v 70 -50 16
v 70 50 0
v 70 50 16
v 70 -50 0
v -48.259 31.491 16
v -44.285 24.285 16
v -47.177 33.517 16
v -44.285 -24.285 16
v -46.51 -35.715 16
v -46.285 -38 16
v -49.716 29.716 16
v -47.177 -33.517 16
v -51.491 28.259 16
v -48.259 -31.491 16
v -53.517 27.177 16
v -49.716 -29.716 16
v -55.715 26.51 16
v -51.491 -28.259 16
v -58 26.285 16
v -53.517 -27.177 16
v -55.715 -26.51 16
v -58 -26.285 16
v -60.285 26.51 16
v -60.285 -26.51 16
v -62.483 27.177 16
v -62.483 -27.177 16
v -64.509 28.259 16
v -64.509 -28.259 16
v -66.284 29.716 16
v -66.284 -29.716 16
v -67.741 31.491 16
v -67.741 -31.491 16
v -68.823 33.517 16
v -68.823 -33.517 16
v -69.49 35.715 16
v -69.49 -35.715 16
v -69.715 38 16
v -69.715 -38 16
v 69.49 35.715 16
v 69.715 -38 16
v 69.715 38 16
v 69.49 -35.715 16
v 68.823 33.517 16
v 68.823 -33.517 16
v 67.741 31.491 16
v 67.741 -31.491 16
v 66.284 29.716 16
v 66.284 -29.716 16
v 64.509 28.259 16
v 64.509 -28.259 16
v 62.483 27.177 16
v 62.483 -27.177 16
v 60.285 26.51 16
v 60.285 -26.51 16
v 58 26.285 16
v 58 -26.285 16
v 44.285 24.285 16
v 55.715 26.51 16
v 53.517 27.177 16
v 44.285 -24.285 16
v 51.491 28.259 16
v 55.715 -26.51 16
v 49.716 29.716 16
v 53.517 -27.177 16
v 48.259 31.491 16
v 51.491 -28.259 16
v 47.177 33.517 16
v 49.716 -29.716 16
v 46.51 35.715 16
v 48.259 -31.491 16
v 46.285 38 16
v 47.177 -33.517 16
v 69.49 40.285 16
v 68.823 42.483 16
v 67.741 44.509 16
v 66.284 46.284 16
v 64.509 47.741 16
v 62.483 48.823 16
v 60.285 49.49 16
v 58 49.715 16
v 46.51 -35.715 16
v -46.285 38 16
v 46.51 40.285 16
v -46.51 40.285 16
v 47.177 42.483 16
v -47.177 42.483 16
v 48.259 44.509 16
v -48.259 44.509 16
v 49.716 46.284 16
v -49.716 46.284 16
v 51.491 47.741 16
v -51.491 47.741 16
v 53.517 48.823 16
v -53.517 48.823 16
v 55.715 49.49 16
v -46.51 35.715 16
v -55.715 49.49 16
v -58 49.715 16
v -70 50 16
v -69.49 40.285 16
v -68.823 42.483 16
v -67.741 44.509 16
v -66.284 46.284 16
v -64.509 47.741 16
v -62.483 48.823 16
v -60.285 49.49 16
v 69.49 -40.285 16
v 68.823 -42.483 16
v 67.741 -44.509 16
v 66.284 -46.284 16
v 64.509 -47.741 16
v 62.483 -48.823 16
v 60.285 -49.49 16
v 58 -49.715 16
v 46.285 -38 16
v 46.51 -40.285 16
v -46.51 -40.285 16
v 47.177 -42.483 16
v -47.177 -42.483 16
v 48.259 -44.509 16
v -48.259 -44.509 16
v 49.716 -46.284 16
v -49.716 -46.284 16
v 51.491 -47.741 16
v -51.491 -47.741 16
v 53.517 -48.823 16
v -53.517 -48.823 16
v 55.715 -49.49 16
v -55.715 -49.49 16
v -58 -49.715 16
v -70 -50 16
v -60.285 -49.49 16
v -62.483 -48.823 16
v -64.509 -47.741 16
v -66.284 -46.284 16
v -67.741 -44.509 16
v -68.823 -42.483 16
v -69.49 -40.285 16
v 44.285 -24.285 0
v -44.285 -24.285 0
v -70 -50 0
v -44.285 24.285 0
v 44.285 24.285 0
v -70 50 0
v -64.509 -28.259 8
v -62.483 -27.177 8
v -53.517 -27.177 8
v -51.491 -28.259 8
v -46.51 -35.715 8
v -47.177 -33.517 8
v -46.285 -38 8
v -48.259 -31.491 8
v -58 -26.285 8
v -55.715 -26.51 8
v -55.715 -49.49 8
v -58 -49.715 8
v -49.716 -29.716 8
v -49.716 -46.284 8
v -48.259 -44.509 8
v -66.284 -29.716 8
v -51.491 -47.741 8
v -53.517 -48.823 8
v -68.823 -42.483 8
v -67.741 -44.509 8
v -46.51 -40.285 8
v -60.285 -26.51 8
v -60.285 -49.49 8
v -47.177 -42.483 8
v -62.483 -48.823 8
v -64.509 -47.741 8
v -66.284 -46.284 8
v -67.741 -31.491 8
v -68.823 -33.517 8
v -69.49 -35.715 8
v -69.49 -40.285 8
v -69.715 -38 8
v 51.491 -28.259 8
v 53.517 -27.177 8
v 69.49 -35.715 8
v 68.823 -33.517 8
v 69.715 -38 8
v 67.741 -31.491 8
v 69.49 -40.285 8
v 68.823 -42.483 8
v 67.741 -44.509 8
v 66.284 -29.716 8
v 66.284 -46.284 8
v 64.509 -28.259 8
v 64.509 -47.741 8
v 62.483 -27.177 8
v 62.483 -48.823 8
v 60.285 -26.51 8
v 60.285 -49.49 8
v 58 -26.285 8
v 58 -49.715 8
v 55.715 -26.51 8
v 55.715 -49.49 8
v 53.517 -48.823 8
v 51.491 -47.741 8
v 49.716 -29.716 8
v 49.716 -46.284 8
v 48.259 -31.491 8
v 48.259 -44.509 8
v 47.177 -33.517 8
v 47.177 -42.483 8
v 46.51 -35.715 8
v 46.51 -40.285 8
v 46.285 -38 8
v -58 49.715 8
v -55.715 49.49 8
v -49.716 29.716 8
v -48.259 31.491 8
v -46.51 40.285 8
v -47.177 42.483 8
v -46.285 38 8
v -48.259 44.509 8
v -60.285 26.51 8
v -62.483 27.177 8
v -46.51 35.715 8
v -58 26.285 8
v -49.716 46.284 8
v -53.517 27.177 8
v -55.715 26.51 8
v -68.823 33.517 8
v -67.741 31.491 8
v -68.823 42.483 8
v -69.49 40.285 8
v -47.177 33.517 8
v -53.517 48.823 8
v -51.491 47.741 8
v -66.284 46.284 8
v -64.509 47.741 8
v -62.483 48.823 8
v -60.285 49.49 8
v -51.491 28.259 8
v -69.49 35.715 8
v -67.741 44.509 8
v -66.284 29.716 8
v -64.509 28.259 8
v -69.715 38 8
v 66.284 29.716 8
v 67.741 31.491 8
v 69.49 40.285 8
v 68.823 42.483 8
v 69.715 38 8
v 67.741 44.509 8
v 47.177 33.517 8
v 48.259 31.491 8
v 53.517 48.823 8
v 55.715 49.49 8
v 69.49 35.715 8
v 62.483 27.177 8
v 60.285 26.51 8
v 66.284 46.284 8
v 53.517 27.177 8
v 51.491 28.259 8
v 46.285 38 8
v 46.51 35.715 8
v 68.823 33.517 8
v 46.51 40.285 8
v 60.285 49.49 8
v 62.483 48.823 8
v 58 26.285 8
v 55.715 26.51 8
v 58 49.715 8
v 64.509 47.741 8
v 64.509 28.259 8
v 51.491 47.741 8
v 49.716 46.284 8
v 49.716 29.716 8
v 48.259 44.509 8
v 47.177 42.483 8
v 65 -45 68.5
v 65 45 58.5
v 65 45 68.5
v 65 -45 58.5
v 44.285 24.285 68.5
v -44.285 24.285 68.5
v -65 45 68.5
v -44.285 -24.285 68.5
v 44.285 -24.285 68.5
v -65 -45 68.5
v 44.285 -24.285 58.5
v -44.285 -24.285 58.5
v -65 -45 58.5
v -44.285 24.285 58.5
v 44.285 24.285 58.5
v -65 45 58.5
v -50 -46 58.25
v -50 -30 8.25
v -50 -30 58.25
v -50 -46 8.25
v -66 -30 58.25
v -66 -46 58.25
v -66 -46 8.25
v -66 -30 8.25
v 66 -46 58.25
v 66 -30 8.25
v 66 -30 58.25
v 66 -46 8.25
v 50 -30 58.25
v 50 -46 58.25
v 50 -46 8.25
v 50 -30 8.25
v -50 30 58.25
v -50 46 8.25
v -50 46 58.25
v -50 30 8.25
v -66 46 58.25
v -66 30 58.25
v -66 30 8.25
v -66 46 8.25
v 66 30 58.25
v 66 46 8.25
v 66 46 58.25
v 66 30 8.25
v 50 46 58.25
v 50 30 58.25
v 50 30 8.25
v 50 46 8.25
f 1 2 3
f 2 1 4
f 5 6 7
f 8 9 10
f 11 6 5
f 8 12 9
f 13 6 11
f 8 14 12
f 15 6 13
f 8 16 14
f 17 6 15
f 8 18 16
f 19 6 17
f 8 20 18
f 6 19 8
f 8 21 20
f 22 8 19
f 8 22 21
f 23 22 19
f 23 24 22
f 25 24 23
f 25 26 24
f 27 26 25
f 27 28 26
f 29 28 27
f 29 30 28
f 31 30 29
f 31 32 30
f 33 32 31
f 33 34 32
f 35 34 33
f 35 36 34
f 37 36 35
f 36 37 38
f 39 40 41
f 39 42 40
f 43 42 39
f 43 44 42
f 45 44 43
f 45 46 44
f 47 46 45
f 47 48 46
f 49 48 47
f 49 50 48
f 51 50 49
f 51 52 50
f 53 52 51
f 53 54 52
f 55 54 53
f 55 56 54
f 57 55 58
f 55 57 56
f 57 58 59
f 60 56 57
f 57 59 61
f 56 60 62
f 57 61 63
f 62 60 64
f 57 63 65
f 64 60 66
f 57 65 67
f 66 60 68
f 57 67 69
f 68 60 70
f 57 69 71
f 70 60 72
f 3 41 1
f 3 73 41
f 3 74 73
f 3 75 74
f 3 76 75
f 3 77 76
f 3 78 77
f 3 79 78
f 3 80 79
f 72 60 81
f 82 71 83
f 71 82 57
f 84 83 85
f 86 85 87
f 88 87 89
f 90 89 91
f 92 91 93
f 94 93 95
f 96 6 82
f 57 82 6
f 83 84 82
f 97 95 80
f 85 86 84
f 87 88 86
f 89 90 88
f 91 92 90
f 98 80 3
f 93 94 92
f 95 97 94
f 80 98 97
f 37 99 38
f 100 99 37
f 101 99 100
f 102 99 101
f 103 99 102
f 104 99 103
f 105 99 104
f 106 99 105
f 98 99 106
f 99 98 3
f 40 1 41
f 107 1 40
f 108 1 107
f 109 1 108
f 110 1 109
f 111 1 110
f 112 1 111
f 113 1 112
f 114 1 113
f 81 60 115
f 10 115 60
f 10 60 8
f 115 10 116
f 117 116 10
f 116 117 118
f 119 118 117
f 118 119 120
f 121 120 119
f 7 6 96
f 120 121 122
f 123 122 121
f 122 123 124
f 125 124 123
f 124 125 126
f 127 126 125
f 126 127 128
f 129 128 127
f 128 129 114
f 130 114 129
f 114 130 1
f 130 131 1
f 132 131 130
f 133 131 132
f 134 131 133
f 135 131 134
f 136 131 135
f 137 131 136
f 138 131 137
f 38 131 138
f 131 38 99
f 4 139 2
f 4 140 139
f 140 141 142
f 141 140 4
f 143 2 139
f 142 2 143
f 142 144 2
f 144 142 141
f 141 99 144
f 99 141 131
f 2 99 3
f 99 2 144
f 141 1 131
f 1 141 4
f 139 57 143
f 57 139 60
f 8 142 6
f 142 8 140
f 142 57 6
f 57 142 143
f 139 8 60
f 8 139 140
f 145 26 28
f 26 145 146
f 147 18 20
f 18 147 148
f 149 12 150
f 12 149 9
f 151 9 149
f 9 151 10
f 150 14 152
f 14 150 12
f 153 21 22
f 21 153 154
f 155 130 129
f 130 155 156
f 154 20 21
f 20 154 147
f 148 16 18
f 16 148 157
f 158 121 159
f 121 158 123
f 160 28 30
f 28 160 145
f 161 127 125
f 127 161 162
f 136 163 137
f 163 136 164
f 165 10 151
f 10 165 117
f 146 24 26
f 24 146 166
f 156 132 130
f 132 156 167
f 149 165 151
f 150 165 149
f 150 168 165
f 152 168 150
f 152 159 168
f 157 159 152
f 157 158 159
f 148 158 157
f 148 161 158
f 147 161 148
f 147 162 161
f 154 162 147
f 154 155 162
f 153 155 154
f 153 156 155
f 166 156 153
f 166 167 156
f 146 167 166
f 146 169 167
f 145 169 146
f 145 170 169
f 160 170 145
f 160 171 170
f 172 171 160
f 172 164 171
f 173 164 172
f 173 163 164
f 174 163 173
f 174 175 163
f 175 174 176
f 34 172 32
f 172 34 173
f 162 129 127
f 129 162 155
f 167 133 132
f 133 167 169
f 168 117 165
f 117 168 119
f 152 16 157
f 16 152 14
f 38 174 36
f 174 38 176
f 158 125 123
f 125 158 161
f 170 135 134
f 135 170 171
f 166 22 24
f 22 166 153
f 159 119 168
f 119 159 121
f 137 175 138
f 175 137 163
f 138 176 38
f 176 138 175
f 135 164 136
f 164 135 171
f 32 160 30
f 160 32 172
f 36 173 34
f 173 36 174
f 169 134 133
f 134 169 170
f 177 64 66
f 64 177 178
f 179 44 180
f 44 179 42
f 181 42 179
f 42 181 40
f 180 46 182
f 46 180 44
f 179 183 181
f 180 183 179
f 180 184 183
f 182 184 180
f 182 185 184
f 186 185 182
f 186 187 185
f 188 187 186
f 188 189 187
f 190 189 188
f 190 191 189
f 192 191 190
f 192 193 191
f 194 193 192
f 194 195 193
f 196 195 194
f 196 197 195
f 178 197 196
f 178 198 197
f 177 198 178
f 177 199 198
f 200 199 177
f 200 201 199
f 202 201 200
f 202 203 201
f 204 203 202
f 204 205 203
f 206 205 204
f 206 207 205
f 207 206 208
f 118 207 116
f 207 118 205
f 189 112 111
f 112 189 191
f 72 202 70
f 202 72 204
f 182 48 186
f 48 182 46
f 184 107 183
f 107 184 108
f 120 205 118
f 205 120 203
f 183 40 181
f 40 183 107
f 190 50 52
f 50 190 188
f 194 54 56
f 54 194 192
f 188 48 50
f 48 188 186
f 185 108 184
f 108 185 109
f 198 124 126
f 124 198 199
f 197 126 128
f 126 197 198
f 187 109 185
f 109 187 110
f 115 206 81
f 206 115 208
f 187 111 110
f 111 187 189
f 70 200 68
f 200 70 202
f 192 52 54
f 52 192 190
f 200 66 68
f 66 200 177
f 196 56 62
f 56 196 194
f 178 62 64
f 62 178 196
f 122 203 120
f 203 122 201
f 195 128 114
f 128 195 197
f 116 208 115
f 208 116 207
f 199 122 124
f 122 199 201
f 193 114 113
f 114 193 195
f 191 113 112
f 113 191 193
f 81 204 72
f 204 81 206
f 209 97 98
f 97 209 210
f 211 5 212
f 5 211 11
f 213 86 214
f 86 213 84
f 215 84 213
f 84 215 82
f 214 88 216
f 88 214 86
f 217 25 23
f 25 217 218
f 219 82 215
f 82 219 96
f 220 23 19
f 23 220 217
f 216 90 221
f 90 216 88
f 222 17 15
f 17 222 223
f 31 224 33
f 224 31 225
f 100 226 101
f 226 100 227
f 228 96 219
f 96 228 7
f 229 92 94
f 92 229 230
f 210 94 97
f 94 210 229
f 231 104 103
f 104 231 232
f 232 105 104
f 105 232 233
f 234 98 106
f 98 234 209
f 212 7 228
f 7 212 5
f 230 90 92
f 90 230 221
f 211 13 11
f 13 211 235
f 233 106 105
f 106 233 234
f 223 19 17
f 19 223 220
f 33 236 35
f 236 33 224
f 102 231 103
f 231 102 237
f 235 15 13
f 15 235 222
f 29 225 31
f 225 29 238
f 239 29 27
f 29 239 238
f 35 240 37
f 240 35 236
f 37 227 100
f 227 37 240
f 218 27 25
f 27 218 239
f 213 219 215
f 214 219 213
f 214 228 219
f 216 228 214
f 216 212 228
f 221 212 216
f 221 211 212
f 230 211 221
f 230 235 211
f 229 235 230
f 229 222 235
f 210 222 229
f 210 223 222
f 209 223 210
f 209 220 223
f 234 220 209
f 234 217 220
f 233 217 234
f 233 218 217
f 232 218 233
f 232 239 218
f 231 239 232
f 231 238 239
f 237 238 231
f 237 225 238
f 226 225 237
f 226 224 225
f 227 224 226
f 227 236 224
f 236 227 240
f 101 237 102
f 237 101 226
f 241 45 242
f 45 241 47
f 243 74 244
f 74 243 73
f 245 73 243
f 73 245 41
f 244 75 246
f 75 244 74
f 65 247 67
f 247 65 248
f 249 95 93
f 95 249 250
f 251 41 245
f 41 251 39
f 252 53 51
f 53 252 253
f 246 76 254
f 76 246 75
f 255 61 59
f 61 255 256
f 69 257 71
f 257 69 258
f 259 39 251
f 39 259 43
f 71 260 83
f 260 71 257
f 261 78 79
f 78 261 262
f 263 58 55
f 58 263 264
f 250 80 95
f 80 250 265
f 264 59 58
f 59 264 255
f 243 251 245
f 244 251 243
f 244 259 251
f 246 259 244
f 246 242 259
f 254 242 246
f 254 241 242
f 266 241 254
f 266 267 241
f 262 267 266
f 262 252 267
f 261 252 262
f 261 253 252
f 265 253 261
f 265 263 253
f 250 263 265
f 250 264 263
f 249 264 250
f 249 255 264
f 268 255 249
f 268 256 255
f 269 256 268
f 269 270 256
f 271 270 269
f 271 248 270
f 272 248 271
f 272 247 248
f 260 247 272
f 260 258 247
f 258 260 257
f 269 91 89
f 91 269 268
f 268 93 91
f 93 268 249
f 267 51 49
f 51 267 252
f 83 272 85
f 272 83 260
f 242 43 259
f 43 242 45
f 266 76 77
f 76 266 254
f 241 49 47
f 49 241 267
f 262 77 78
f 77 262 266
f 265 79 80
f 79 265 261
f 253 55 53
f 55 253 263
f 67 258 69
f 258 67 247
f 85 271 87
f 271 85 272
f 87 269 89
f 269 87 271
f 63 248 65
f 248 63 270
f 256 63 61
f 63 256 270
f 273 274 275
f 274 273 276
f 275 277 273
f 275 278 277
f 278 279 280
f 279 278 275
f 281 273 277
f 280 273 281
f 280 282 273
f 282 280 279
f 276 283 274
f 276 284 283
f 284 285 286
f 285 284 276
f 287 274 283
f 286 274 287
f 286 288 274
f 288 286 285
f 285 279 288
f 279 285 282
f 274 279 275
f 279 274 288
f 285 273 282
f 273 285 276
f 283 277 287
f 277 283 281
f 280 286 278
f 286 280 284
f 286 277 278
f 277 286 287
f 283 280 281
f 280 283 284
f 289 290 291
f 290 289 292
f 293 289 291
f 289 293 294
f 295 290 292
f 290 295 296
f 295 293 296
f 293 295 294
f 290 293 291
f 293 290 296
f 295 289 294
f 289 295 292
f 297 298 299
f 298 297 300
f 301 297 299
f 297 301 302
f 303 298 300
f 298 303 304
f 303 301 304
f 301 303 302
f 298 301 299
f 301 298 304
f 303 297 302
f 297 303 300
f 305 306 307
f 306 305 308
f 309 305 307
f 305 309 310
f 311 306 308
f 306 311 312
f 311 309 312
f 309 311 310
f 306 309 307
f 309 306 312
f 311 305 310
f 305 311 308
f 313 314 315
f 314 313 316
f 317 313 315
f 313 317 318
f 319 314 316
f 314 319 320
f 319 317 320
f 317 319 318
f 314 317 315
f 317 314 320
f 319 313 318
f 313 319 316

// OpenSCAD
$fn = 32;

// ------------------------------------------------------------------------
// Frame cube: base 140 x 100 mm, posts 50 mm tall
// Every part is its own module, assembly() places every instance.
// ------------------------------------------------------------------------

// --- part 1 ---
module base_frame() {
  difference() {
    translate([-70, -50, 0]) cube([140, 100, 16]);
    translate([-44.285, -24.285, -1]) cube([88.57, 48.57, 18]);
    translate([-58, -38, 8]) cylinder(h = 9, d = 23.43);
    translate([58, -38, 8]) cylinder(h = 9, d = 23.43);
    translate([-58, 38, 8]) cylinder(h = 9, d = 23.43);
    translate([58, 38, 8]) cylinder(h = 9, d = 23.43);
  }
}

// --- part 2 ---
module corner_post() {
  translate([-8, -8, 0]) cube([16, 16, 50]);
}

// --- part 3 ---
module top_frame() {
  difference() {
    translate([-65, -45, 0]) cube([130, 90, 10]);
    translate([-44.285, -24.285, -1]) cube([88.57, 48.57, 12]);
  }
}

// --- assembly ---
module assembly() {
  color([0.80, 0.24, 0.20]) translate([0, 0, 0]) rotate([0, 0, 0]) base_frame();
  color([0.20, 0.45, 0.75]) translate([-58, -38, 8.25]) rotate([0, 0, 0]) corner_post();
  color([0.25, 0.62, 0.32]) translate([58, -38, 8.25]) rotate([0, 0, 0]) corner_post();
  color([0.92, 0.70, 0.18]) translate([-58, 38, 8.25]) rotate([0, 0, 0]) corner_post();
  color([0.58, 0.35, 0.70]) translate([58, 38, 8.25]) rotate([0, 0, 0]) corner_post();
  color([0.16, 0.66, 0.66]) translate([0, 0, 58.5]) rotate([0, 0, 0]) top_frame();
}

assembly();
